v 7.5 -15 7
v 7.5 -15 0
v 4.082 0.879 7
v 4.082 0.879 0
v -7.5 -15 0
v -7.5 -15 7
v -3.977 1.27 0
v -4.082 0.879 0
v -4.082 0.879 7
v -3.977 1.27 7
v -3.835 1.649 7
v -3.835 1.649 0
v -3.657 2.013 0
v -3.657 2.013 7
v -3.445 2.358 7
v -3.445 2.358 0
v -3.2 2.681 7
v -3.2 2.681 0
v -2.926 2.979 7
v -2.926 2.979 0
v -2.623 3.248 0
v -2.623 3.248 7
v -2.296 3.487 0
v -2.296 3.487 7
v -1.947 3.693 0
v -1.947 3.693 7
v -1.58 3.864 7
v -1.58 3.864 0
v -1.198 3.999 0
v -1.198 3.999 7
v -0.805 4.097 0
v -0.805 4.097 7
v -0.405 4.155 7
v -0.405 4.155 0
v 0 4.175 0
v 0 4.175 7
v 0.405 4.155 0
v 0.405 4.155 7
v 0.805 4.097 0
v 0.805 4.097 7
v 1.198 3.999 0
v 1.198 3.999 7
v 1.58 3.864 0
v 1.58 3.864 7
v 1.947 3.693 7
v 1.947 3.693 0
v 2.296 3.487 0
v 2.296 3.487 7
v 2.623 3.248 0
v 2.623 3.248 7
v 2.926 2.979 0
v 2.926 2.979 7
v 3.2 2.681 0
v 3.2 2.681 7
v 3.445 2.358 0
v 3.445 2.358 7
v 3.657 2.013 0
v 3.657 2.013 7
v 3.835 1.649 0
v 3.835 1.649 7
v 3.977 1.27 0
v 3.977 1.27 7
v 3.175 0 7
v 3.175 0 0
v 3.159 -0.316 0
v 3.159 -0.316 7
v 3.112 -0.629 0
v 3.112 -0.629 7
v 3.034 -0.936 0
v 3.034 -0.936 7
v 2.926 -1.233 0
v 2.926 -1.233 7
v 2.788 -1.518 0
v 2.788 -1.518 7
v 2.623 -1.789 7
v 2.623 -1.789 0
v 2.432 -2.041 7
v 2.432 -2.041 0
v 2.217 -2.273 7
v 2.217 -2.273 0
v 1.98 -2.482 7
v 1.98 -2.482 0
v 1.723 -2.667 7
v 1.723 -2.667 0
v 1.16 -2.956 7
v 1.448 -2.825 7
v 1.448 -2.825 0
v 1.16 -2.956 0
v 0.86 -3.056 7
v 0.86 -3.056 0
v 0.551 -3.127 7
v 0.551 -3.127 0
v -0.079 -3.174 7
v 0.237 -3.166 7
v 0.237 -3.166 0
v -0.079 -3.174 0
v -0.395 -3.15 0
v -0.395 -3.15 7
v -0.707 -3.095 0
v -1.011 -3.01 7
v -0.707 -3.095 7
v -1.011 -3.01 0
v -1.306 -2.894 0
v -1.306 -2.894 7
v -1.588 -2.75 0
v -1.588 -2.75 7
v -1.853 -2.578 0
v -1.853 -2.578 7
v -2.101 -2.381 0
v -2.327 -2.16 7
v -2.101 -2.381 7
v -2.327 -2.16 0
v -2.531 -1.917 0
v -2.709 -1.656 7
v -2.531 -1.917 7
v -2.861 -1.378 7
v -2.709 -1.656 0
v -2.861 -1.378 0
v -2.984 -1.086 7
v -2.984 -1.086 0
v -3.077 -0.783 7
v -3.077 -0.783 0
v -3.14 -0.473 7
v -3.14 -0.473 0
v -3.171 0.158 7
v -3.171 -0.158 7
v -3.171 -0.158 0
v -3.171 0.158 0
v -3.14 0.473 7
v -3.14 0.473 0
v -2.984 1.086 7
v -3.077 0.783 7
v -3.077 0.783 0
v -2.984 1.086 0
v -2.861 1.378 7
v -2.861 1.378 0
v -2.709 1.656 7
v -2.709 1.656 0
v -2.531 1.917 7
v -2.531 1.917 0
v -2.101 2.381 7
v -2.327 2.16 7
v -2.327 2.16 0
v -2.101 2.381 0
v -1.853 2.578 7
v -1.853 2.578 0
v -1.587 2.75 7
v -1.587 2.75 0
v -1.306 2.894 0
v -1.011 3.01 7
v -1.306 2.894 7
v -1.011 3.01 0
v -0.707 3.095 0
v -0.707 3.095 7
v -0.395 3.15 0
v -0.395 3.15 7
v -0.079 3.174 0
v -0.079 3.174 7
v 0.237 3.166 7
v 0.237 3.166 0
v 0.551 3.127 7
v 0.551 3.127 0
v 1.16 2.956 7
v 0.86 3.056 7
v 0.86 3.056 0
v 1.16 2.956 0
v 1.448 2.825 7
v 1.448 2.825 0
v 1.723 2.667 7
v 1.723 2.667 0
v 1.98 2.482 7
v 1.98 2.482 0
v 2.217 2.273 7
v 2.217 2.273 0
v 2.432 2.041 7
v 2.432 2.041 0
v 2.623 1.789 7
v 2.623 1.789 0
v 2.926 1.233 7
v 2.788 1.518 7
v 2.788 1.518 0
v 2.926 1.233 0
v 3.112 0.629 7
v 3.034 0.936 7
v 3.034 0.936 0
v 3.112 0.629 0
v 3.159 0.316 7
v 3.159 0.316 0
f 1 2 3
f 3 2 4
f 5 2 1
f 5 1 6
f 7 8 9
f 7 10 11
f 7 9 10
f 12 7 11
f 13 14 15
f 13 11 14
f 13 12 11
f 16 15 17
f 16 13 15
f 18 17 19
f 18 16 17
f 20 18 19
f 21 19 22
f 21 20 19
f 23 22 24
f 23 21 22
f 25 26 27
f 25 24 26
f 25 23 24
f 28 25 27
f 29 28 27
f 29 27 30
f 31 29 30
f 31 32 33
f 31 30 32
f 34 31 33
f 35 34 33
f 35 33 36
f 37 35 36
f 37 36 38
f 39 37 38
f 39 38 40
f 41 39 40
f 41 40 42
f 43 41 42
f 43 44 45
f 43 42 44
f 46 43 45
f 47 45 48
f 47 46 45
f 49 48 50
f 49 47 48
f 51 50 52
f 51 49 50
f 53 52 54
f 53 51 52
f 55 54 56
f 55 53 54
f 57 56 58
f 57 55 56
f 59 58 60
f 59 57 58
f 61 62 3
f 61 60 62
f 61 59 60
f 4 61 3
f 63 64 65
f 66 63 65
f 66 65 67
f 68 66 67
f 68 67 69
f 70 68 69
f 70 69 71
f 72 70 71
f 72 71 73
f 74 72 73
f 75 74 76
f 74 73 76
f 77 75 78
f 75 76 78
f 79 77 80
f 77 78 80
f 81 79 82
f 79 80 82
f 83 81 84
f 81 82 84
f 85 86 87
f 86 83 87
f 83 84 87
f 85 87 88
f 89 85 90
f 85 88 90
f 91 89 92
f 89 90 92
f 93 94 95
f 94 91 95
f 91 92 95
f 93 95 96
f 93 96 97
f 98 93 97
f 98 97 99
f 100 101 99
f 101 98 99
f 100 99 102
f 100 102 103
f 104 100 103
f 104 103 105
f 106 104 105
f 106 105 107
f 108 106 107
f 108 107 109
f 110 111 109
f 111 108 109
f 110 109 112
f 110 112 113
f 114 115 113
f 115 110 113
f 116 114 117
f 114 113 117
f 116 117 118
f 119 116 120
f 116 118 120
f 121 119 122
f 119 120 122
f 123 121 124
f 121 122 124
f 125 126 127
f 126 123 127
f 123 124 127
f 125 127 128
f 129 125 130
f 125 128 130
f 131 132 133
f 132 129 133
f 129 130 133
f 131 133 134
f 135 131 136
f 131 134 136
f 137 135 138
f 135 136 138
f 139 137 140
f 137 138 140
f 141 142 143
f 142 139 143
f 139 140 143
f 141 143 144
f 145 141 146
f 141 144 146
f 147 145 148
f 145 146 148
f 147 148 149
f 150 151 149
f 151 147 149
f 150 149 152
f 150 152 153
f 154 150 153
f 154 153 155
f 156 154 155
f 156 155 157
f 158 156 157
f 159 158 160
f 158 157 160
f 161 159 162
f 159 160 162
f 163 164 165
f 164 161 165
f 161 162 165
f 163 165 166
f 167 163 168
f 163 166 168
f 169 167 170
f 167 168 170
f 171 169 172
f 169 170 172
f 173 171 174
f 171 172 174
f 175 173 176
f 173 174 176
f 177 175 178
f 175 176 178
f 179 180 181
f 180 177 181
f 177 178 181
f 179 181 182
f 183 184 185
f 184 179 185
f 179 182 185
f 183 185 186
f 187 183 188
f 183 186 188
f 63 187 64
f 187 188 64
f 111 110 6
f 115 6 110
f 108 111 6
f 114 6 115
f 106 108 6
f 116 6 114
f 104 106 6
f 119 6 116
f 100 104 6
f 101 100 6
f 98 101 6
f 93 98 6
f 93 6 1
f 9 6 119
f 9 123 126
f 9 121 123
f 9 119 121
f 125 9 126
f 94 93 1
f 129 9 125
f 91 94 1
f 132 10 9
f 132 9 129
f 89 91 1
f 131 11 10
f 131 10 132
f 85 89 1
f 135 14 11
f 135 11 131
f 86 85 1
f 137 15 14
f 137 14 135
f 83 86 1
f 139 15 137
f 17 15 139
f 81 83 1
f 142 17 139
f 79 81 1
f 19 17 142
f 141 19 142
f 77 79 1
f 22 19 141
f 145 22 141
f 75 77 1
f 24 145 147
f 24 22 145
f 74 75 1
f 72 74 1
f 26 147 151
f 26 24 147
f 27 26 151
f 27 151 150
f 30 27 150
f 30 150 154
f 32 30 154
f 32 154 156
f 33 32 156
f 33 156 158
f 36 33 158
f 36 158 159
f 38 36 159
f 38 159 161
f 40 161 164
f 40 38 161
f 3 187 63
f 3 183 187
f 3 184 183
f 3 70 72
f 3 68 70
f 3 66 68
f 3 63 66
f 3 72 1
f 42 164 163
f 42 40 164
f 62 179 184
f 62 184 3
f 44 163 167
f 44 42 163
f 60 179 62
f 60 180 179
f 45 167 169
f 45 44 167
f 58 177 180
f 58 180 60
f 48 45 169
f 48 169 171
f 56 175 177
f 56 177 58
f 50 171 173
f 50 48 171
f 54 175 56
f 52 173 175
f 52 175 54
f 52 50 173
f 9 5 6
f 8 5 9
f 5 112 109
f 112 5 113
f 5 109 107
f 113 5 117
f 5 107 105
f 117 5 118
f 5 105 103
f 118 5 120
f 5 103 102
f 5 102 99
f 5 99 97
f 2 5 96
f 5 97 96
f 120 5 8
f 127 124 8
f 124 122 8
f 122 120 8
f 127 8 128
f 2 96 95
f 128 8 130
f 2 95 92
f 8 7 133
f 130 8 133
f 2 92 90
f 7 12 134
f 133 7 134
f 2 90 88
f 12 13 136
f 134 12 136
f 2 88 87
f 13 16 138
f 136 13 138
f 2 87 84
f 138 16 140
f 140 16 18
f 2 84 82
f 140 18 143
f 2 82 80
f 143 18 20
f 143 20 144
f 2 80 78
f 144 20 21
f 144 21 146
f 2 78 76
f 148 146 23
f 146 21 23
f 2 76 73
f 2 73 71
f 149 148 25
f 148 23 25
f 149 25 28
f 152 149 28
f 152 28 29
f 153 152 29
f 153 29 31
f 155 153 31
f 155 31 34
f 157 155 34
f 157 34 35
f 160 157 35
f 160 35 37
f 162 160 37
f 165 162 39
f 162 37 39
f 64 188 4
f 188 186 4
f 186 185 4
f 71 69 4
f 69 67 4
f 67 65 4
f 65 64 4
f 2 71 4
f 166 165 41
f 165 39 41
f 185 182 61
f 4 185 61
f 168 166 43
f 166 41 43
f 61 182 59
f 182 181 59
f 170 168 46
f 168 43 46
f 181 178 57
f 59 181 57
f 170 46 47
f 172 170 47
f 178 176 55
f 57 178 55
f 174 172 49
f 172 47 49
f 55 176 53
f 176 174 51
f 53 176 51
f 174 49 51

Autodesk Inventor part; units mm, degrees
ref_plane "YZ Plane" through (0, 0, 0) normal (1, 0, 0) x (0, 1, 0)
ref_plane "XZ Plane" through (0, 0, 0) normal (0, 1, 0) x (-1, 0, 0)
ref_plane "XY Plane" through (0, 0, 0) normal (0, 0, 1) x (1, 0, 0)
sketch "Boceto1" plane through (0, 0, 0) normal (0, 0, 1) x (1, 0, 0)
  circle A0 centre (0, 0) radius 3.175
  arc A1 (4.0815, 0.8787) -> (-4.0815, 0.8787) centre (0, 0) ccw
  line L0 (0, 0) -> (0, -15) construction
  line L1 (0, -15) -> (7.5, -15) construction
  line L2 (0, -15) -> (-7.5, -15) construction
  line L3 (-7.5, -15) -> (-4.0815, 0.8787)
  line L4 (7.5, -15) -> (4.0815, 0.8787)
  line L5 (7.5, -15) -> (-7.5, -15)
  dimension "d0" = 6.35
  dimension "d1" = 1
  dimension "d2" = 15
  dimension "d3" = 7.5
  dimension "d4" = 7.5
extrude "Extrusión1" add sketch "Boceto1" along normal blind 7
properties part number "base"
